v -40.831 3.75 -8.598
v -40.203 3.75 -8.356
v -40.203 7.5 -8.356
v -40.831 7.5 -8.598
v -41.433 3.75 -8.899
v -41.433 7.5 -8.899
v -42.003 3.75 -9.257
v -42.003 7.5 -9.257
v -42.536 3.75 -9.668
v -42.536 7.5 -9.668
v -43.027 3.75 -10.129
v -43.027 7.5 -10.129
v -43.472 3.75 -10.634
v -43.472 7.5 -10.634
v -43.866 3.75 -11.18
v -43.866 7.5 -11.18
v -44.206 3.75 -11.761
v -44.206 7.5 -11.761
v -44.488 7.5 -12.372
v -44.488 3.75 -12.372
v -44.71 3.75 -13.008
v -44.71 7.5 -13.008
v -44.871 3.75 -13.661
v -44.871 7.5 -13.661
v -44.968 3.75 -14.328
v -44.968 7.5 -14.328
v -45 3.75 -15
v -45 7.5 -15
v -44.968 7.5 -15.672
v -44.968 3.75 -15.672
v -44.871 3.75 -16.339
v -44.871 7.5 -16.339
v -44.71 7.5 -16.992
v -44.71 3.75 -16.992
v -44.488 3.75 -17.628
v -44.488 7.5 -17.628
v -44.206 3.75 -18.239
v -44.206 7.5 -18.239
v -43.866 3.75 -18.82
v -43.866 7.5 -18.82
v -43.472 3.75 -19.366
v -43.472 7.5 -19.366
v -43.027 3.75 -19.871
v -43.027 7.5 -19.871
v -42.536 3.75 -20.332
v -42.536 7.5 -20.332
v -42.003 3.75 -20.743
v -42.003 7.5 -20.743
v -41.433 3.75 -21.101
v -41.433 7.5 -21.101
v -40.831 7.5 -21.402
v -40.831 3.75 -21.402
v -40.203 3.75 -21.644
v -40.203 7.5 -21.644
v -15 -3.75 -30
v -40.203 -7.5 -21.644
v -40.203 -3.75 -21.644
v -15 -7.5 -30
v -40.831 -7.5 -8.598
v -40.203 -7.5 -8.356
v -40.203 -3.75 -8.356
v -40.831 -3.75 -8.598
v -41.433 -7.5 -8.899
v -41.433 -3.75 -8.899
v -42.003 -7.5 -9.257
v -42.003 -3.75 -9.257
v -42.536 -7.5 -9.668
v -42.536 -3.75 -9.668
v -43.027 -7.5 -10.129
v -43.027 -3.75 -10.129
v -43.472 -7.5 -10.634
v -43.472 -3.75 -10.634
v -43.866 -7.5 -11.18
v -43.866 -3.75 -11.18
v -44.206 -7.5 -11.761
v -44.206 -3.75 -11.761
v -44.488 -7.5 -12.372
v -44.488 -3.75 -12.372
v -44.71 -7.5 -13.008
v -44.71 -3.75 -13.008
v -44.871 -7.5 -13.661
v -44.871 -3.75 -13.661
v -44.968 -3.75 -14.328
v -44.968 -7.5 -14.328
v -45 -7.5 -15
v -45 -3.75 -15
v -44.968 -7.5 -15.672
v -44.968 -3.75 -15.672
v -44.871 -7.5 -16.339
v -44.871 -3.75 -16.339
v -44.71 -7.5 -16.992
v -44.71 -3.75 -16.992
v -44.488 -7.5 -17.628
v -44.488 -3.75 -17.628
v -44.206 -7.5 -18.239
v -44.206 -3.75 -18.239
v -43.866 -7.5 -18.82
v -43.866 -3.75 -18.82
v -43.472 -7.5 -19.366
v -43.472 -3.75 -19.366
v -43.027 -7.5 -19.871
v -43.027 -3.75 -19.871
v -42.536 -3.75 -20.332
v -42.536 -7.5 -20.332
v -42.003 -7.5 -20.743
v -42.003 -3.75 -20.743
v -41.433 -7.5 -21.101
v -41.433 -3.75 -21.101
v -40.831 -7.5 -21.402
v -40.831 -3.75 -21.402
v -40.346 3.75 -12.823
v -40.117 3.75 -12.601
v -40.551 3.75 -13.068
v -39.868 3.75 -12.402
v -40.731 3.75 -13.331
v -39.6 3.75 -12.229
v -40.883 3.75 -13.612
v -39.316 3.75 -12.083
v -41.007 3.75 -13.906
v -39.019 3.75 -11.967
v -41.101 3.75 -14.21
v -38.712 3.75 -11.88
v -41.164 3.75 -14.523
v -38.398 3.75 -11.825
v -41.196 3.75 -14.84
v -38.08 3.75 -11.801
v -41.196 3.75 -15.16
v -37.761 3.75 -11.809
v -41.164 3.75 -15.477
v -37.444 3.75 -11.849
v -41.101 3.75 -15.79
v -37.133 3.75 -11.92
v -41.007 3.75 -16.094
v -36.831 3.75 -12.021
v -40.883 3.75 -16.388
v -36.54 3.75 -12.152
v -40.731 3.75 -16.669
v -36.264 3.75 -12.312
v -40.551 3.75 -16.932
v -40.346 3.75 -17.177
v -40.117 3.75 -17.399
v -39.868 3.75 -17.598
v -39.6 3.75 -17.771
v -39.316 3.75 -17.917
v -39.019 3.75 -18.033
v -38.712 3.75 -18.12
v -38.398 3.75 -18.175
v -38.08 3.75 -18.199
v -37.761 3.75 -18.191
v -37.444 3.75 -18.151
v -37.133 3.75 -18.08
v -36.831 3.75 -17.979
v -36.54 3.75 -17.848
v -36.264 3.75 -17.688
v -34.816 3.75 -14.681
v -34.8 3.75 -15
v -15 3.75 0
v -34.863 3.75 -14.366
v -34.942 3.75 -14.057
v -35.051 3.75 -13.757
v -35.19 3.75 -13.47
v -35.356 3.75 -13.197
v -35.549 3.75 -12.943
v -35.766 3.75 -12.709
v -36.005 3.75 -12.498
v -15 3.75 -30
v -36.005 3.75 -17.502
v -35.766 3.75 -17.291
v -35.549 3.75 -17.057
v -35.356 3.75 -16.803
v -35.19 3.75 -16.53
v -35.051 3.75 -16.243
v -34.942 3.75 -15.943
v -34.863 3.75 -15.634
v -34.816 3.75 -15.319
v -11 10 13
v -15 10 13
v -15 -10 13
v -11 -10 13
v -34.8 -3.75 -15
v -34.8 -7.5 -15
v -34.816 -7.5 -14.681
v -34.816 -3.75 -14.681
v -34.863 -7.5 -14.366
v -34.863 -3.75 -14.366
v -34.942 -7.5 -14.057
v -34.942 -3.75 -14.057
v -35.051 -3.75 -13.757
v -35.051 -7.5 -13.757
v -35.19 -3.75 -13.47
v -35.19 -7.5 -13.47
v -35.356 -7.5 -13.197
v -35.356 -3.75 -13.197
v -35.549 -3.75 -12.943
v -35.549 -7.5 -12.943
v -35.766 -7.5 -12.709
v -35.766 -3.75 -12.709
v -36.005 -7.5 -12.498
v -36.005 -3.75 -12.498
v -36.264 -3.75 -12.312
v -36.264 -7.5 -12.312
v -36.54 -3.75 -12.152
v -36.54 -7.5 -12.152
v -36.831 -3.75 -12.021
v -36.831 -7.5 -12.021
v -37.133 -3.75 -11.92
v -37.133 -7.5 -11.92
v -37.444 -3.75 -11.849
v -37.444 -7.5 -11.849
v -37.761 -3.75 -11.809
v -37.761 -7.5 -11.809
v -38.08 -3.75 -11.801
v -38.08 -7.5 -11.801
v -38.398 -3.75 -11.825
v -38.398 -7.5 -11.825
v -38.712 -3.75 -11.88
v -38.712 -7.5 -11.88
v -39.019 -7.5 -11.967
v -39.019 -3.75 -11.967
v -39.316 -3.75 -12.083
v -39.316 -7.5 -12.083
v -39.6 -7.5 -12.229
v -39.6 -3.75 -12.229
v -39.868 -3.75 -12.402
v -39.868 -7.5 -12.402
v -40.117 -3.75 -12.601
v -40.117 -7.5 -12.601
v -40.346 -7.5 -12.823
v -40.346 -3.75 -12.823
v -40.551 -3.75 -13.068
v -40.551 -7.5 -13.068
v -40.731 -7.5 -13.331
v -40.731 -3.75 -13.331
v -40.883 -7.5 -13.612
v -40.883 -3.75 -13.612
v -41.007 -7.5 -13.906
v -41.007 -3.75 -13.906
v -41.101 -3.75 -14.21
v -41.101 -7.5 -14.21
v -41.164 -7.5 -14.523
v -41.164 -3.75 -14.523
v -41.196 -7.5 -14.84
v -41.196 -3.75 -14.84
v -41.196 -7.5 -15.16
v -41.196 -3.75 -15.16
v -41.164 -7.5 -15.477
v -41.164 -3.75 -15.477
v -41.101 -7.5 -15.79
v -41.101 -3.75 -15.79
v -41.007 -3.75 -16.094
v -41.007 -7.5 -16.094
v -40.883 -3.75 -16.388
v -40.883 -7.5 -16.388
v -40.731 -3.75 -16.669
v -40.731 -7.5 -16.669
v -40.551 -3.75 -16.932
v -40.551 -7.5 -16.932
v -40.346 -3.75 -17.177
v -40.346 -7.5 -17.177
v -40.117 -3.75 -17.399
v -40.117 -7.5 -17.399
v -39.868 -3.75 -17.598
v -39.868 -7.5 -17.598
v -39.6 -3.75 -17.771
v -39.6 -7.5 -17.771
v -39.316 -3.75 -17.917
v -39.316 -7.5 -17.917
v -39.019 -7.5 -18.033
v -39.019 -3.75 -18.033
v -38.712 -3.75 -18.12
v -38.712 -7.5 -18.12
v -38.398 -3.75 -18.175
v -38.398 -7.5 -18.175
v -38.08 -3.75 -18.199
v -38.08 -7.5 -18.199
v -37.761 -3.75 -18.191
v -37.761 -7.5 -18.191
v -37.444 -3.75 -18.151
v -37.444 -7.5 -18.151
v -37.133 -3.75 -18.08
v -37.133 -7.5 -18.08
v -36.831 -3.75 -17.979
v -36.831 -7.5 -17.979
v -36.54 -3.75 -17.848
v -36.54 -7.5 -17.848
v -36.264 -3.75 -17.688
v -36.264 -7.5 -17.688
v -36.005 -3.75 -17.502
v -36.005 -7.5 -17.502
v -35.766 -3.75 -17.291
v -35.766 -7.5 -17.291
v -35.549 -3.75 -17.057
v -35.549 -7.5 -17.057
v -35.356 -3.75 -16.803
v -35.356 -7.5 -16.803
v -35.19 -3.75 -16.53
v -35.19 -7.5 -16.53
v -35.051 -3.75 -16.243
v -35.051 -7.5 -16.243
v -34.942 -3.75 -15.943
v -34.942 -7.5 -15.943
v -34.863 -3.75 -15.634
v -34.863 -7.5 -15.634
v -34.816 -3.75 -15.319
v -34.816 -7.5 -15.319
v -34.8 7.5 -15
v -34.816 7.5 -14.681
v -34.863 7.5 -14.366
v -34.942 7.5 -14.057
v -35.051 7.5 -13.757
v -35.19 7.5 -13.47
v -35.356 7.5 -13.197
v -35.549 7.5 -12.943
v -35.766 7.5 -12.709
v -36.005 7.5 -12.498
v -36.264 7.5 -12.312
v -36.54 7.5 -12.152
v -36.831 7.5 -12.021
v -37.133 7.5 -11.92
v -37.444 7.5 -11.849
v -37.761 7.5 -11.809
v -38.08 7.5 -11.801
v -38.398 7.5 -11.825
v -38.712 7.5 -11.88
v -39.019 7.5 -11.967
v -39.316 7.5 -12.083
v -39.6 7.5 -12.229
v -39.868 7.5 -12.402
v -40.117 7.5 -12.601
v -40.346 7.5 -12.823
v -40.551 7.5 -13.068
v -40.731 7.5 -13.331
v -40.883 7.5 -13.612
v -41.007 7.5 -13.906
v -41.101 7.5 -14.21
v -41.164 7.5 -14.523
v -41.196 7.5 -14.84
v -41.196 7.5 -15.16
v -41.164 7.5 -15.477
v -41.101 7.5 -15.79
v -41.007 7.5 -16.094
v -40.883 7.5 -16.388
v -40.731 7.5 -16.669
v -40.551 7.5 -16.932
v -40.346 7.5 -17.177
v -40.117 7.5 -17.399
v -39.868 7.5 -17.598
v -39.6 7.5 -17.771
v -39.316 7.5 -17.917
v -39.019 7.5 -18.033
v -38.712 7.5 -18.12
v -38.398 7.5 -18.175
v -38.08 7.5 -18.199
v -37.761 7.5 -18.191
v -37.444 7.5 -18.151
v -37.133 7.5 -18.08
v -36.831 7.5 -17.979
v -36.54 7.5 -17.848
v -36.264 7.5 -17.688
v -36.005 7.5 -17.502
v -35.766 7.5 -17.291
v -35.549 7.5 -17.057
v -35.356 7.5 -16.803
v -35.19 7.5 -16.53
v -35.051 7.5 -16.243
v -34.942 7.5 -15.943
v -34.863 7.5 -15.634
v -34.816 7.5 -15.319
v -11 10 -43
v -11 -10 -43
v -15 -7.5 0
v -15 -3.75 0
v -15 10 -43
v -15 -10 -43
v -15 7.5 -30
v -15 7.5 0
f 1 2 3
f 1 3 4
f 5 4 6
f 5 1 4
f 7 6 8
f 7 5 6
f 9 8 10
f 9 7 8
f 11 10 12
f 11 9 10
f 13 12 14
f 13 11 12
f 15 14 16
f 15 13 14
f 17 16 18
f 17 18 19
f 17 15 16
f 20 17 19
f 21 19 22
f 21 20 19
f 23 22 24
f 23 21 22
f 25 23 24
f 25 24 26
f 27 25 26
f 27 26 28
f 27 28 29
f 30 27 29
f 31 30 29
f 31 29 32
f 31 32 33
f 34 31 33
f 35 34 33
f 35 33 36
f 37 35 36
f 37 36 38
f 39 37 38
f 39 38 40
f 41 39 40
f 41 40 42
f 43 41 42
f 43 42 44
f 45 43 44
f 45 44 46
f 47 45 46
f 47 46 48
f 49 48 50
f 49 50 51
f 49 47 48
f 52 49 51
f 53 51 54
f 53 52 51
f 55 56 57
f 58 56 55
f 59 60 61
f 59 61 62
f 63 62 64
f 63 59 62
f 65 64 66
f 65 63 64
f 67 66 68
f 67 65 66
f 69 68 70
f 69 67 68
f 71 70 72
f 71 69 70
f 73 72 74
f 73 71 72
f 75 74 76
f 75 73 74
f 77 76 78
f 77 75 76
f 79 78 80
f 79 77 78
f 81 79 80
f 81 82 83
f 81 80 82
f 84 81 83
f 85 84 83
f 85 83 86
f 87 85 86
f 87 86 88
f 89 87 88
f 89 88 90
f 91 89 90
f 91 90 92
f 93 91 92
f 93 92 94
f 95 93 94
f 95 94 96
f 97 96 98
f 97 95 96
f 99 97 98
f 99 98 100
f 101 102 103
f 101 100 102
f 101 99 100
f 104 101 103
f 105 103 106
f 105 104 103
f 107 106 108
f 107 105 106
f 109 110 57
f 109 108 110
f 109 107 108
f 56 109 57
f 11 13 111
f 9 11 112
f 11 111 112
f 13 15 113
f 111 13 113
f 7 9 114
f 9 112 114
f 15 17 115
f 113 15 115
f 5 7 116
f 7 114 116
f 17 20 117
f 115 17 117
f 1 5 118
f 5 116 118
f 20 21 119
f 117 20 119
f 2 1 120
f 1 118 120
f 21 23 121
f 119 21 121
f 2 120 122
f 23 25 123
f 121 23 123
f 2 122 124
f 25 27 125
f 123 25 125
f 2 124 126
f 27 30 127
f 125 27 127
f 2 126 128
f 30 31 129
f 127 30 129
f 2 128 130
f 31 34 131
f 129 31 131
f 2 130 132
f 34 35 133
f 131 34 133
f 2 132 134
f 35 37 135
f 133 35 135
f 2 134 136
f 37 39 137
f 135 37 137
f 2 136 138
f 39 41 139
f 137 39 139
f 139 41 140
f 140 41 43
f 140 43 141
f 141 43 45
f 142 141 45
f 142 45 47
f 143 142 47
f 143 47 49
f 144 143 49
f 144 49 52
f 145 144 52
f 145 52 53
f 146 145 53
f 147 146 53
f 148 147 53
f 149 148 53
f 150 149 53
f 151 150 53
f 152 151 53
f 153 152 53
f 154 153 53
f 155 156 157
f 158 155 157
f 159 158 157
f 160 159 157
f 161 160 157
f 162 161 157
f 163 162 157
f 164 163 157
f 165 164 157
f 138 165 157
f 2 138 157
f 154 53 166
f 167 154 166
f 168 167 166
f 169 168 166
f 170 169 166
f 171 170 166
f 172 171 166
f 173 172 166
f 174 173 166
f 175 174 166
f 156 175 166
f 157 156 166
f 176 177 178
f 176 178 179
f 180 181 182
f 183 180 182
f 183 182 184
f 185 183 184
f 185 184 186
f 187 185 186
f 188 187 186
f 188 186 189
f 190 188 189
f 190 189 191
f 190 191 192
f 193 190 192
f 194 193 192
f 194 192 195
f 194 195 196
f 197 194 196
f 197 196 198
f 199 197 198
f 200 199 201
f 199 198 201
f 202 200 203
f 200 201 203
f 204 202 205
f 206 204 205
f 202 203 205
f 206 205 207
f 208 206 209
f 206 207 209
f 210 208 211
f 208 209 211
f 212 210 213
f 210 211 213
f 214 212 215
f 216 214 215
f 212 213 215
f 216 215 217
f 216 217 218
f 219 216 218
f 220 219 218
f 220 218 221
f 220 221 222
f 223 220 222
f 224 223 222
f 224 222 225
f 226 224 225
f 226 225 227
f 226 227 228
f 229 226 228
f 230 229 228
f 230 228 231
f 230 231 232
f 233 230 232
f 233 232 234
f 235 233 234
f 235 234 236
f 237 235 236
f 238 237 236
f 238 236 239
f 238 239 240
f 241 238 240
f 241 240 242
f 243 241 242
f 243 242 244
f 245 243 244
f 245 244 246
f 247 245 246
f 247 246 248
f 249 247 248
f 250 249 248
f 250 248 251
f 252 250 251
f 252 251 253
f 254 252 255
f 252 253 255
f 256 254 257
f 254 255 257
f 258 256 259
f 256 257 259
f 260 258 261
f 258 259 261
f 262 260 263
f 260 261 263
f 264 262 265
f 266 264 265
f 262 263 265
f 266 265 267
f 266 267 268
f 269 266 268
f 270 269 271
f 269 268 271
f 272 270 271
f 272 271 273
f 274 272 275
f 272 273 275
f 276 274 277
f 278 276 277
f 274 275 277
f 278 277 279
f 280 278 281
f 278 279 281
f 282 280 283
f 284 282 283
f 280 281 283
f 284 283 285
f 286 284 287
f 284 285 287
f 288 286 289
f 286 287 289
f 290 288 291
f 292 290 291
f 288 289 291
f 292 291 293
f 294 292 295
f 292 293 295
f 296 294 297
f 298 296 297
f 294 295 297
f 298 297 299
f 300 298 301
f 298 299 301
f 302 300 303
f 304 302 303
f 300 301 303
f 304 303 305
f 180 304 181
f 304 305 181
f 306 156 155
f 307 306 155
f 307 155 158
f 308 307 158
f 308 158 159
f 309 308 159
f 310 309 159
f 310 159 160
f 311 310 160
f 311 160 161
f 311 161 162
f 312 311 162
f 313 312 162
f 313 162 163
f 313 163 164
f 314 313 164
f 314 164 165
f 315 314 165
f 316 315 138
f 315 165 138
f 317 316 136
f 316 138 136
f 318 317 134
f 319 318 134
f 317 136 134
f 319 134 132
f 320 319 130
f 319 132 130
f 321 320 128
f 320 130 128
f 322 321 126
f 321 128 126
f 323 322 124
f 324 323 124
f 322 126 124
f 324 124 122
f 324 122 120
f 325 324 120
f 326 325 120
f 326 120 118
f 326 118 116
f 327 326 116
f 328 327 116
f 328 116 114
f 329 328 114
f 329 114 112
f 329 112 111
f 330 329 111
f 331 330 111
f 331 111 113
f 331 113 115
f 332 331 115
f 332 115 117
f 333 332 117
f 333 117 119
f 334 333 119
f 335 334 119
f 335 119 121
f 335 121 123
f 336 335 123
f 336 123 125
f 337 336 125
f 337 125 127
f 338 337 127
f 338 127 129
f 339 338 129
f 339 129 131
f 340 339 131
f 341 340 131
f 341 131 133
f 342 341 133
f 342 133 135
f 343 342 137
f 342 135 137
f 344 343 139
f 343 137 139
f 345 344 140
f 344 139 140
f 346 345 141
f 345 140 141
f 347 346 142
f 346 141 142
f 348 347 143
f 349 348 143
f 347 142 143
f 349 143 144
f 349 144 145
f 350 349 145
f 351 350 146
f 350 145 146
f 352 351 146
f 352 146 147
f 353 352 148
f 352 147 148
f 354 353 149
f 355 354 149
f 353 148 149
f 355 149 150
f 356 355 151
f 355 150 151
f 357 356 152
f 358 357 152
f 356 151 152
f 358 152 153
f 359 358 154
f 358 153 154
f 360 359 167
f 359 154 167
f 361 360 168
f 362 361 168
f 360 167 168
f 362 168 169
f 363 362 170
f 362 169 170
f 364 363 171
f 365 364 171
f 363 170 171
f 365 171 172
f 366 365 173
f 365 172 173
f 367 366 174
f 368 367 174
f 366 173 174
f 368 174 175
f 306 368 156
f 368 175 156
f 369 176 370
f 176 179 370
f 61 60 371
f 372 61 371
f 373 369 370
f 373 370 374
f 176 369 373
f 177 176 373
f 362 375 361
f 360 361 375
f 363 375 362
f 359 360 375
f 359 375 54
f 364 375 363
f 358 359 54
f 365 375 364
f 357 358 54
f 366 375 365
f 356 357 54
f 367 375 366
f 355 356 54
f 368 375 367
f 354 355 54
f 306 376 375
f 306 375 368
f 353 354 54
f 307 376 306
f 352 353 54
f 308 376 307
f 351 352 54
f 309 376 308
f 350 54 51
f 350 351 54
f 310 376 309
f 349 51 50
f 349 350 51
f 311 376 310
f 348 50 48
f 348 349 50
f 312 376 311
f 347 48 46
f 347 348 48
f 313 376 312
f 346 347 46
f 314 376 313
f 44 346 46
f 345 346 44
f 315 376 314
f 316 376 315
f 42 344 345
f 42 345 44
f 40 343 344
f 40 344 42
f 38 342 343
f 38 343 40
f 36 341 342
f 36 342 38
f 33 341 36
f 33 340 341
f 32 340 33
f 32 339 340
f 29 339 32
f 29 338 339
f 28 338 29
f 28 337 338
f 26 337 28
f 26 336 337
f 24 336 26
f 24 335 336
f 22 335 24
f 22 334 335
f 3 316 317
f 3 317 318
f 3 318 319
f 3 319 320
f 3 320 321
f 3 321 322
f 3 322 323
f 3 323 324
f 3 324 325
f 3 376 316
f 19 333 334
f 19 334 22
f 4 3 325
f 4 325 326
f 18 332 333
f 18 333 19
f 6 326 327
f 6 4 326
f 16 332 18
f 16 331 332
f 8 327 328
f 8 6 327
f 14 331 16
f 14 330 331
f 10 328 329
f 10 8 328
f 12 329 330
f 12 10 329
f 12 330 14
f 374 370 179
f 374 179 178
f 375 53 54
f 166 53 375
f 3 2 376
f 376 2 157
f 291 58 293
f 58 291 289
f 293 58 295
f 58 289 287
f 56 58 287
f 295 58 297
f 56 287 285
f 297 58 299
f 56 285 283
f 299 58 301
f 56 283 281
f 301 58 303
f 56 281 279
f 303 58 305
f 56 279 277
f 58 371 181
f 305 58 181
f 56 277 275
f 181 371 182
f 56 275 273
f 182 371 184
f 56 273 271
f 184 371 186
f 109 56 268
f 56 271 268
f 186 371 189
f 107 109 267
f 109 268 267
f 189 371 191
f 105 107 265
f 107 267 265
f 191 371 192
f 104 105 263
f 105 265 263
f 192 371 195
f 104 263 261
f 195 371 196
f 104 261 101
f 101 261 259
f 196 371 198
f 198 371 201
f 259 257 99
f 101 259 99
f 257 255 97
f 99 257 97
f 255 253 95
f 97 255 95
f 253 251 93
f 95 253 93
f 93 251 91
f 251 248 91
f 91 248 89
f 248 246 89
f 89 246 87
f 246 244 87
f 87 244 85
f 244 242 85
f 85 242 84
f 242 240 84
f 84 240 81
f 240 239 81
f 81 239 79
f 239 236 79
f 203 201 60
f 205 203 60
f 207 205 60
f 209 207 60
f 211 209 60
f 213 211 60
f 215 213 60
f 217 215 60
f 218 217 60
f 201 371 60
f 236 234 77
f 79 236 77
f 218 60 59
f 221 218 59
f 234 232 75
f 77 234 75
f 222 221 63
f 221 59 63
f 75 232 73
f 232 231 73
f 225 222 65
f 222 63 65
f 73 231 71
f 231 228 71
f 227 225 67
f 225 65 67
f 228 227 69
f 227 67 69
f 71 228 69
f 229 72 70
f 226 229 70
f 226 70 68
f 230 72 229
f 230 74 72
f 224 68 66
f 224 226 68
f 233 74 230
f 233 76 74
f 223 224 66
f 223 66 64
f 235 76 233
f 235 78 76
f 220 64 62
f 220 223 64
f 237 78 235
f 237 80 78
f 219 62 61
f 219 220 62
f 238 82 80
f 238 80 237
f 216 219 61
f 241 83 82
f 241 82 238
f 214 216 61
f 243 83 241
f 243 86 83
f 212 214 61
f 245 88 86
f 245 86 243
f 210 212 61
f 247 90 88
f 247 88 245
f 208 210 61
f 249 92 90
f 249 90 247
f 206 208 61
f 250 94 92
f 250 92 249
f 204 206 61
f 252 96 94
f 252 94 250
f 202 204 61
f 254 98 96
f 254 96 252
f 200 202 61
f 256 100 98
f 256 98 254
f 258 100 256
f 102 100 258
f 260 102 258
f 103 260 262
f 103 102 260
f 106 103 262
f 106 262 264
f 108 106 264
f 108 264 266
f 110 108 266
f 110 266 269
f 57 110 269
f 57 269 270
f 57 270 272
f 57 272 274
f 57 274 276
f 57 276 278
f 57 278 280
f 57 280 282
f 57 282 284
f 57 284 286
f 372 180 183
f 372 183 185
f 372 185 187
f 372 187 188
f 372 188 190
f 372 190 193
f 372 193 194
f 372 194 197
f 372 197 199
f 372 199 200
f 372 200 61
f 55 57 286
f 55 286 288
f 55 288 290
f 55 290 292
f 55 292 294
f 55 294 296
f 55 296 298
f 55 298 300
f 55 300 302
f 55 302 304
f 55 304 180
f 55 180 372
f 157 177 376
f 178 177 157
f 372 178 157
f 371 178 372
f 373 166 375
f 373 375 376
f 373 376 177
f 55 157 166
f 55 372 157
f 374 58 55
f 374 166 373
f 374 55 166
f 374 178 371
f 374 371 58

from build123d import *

# Parameters (mm, degrees)
RECTANGLE001_W   = 30
RECTANGLE001_H   = 7.5
EXTRUDE003_DEPTH = 30
SKETCH_R         = 3.2
EXTRUDE002_DEPTH = 15
EXTRUDE_DEPTH    = 10


with BuildPart() as extrude003:
    # Rectangle001 → Extrude003 (new body)
    with BuildSketch(Plane(origin=(-30, -3.75, -15), x_dir=(1, 0, 0), z_dir=(0, 0, 1))):
        with Locations((15, 3.75)):
            Rectangle(RECTANGLE001_W, RECTANGLE001_H)
    extrude(amount=EXTRUDE003_DEPTH)


with BuildPart() as extrude003_1:
    # Extrude003 placement: moved
    add(extrude003.part.moved(Location((-15, 0, -15))))


with BuildPart() as cut:
    # Sketch → Extrude002 (new body)
    with BuildSketch(Plane(origin=(-15, 0, -30), x_dir=(1, 0, 0), z_dir=(0, -1, 0))):
        with BuildLine():
            Line((-25.202842, 21.644358), (0, 30))
            Line((0, 30), (0, 0))
            Line((-25.202842, 8.355642), (0, 0))
            ThreePointArc((-25.202842, 21.644358), (-30, 15), (-25.202842, 8.355642))
        make_face()
        with Locations((-23, 15)):
            Circle(SKETCH_R, mode=Mode.SUBTRACT)
    extrude(amount=-EXTRUDE002_DEPTH)


with BuildPart() as cut_1:
    # Extrude002 placement: moved
    add(cut.part.moved(Location((0, -7.5, 0))))

    # Cut: cut Extrude003
    add(extrude003_1.part, mode=Mode.SUBTRACT)


with BuildPart() as body:
    # Sketch001 → Extrude (new body, symmetric)
    with BuildSketch(Plane.XZ):
        Polygon((-15, 0), (-15, 13), (-11, 13), (-11, -43), (-15, -43), (-15, -30), align=None)
    extrude(amount=EXTRUDE_DEPTH, both=True)

    # Fusion: union Cut
    add(cut_1.part)


solid = body.part
